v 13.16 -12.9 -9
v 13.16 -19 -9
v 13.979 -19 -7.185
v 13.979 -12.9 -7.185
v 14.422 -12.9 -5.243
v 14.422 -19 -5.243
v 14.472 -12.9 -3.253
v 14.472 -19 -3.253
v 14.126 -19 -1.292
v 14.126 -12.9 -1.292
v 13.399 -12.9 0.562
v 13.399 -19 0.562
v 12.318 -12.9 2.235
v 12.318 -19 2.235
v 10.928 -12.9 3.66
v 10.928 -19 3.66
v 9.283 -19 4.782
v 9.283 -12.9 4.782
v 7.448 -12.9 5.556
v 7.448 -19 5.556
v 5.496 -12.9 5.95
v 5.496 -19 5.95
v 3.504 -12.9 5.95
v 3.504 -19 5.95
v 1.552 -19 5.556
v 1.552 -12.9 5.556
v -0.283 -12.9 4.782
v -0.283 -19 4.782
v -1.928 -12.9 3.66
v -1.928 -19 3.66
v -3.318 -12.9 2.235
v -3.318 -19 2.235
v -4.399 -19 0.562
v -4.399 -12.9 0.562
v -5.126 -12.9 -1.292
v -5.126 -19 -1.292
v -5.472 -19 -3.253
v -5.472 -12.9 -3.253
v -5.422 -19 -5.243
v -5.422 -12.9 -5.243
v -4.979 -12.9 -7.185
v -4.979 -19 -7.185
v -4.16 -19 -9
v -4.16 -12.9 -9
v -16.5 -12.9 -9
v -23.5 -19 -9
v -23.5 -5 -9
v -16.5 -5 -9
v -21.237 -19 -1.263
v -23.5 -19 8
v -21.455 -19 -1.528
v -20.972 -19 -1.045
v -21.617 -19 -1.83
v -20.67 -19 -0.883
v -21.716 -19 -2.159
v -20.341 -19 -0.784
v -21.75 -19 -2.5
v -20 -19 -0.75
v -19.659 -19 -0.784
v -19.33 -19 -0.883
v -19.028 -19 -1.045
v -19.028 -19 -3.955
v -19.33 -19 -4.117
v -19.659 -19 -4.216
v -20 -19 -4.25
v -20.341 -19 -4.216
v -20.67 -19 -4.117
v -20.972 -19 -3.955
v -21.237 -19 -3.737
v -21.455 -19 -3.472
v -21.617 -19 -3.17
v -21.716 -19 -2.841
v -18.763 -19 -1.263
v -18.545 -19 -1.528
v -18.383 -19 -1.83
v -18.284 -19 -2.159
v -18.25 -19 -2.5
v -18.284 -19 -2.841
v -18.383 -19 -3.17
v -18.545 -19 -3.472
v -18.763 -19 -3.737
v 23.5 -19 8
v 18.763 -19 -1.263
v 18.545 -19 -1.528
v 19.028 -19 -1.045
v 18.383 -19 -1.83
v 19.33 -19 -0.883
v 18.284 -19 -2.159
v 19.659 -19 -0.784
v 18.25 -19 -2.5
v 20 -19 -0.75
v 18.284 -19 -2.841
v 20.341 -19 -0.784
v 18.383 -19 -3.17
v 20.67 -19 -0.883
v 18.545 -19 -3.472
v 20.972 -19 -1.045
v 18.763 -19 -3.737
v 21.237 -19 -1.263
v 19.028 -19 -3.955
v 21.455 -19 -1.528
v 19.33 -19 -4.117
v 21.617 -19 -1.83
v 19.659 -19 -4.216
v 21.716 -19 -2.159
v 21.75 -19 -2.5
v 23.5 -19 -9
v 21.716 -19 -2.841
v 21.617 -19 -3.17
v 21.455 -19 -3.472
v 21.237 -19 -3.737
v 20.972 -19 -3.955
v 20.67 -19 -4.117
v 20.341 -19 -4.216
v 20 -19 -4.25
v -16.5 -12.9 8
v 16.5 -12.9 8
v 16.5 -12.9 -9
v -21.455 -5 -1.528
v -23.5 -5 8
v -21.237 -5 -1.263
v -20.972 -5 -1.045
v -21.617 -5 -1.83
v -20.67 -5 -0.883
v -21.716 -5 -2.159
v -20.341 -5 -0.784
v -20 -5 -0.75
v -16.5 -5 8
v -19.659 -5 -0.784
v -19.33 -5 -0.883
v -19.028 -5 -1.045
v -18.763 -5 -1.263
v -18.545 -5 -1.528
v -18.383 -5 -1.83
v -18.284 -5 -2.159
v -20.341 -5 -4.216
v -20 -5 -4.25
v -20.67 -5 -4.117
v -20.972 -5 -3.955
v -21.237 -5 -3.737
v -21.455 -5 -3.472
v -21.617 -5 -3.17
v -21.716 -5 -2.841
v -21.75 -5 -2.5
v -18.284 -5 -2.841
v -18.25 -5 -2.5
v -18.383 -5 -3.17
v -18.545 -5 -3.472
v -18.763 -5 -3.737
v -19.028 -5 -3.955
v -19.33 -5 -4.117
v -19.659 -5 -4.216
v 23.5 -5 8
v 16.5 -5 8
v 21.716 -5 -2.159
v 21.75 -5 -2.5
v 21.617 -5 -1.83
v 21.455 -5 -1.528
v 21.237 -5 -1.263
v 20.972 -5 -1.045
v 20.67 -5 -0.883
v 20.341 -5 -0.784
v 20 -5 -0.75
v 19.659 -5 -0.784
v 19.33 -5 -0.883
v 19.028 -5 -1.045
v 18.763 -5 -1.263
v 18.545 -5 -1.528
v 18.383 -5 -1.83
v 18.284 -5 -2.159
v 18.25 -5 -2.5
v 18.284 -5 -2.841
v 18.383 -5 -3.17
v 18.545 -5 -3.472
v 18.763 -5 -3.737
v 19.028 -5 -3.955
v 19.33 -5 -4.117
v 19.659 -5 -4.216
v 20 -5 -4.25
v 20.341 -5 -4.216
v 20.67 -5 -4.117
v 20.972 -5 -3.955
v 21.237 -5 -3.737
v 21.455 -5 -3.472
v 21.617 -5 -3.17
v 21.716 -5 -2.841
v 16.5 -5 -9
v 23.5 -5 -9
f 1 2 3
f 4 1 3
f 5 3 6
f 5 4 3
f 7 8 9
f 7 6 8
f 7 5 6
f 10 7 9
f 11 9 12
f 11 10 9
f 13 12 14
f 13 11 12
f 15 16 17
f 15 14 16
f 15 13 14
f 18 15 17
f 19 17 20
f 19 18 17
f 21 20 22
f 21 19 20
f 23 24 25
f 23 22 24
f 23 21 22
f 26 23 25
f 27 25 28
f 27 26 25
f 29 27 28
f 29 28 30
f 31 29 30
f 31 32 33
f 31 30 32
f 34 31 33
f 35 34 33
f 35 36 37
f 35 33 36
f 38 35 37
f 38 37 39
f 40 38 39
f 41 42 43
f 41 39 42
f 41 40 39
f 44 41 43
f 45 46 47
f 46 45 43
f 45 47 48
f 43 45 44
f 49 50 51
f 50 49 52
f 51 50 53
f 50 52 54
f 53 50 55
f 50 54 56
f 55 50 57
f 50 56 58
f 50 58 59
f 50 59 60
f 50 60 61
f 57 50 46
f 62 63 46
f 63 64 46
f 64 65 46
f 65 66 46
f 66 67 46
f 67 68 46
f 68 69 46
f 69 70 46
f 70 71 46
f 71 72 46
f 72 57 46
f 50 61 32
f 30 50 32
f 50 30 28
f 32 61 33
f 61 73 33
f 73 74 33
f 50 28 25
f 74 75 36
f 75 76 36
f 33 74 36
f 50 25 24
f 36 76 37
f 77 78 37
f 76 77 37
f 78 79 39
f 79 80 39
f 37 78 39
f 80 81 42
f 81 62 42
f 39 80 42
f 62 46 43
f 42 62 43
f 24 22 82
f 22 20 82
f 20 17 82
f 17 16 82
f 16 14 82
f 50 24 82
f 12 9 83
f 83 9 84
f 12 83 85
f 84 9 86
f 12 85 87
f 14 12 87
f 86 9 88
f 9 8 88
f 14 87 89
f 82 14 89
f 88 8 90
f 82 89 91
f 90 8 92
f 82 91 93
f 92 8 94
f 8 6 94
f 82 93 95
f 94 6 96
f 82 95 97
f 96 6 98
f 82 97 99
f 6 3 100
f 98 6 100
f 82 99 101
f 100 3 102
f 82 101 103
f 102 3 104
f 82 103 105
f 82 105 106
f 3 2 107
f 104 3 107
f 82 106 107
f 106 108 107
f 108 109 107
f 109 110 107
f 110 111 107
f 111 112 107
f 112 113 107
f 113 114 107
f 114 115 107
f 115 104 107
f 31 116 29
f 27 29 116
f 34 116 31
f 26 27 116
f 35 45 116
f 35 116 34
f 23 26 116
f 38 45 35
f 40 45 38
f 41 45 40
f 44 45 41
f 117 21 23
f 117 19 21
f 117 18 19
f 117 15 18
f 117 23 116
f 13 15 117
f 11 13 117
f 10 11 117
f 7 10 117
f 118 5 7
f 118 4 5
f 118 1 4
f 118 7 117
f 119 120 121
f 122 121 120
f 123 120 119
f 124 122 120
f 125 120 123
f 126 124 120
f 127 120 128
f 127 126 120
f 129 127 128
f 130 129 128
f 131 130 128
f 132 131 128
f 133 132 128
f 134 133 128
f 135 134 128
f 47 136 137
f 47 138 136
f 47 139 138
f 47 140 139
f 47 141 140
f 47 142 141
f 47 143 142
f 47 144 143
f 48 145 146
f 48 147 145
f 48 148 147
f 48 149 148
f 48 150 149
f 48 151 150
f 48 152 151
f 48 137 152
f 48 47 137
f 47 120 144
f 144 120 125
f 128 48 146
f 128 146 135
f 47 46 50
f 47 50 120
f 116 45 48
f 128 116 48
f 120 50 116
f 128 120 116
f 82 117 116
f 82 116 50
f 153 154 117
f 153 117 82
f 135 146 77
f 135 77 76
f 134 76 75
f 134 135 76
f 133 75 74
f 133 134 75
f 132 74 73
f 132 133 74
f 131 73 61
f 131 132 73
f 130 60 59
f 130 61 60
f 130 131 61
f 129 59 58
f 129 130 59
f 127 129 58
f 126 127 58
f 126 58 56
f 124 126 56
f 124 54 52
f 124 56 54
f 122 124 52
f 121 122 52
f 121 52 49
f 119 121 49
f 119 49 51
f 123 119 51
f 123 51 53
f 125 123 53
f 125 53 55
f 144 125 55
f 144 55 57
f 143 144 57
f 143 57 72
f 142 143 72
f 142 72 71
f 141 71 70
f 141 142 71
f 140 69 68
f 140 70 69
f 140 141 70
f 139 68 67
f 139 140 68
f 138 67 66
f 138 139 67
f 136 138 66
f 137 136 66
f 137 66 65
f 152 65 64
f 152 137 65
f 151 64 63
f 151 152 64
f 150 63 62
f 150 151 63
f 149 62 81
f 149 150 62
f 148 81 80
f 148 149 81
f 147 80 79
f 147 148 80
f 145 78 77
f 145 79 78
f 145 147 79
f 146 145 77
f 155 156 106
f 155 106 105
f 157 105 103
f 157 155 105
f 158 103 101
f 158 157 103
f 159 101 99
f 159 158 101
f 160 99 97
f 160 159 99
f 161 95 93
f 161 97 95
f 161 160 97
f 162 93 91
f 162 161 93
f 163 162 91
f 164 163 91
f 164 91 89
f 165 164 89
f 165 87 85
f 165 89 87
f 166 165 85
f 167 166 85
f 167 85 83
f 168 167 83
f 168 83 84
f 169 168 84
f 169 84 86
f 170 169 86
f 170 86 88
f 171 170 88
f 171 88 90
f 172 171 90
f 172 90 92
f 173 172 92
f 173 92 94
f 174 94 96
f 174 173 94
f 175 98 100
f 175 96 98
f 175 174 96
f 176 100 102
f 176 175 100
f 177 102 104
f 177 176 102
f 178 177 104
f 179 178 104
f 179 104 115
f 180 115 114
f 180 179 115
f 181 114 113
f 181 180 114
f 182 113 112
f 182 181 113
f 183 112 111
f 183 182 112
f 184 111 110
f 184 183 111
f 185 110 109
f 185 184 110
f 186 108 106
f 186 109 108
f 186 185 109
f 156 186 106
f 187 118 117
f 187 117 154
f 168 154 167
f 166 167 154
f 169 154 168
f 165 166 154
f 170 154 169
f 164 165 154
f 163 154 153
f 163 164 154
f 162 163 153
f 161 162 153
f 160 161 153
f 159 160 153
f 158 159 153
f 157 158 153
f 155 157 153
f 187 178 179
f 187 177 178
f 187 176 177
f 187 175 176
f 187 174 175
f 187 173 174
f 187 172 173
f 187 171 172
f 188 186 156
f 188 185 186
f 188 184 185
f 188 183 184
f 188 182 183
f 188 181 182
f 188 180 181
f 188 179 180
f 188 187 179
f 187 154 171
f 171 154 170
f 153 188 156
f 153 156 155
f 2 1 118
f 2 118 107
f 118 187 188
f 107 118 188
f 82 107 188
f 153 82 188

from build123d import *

# Parameters (mm, degrees)
CYLINDER025_R          = 1.75
CYLINDER025_DEPTH      = 44
CYLINDER025_ROLL_ANGLE = 90
CYLINDER034_R          = 1.75
CYLINDER034_DEPTH      = 44
CYLINDER034_ROLL_ANGLE = 90
CYLINDER035_R          = 1.75
CYLINDER035_DEPTH      = 44
CYLINDER035_ROLL_ANGLE = 90
CYLINDER036_R          = 10
CYLINDER036_DEPTH      = 34
CYLINDER036_ROLL_ANGLE = 90
CYLINDER024_R          = 1.75
CYLINDER024_DEPTH      = 44
CYLINDER024_ROLL_ANGLE = 90
BOX052_W               = 7
BOX052_H               = 7.9
BOX052_DEPTH           = 17
BOX050_W               = 47
BOX050_H               = 6.1
BOX050_DEPTH           = 17
BOX051_W               = 7
BOX051_H               = 7.9
BOX051_DEPTH           = 17


with BuildPart() as cylinder_for_hole_10_groovemount_r001:
    # Cylinder025 → Cylinder025 (new body)
    with BuildSketch(Plane.XY):
        Circle(CYLINDER025_R)
    extrude(amount=CYLINDER025_DEPTH)


with BuildPart() as cylinder_for_hole_10_groovemount_r001_1:
    # Cylinder025 roll: moved
    add(cylinder_for_hole_10_groovemount_r001.part.rotate(Axis((0, 0, 0), (1, 0, 0)), CYLINDER025_ROLL_ANGLE))


with BuildPart() as cylinder_for_hole_10_groovemount_r001_2:
    # Cylinder025 placement: moved
    add(cylinder_for_hole_10_groovemount_r001_1.part.moved(Location((20, 6, -2.5))))


with BuildPart() as cylinder_for_hole_3_motherboard002:
    # Cylinder034 → Cylinder034 (new body)
    with BuildSketch(Plane.XY):
        Circle(CYLINDER034_R)
    extrude(amount=CYLINDER034_DEPTH)


with BuildPart() as cylinder_for_hole_3_motherboard002_1:
    # Cylinder034 roll: moved
    add(cylinder_for_hole_3_motherboard002.part.rotate(Axis((0, 0, 0), (1, 0, 0)), CYLINDER034_ROLL_ANGLE))


with BuildPart() as cylinder_for_hole_3_motherboard002_2:
    # Cylinder034 placement: moved
    add(cylinder_for_hole_3_motherboard002_1.part.moved(Location((-20, 6, -13.5))))


with BuildPart() as cylinder_for_hole_4_motherboard002:
    # Cylinder035 → Cylinder035 (new body)
    with BuildSketch(Plane.XY):
        Circle(CYLINDER035_R)
    extrude(amount=CYLINDER035_DEPTH)


with BuildPart() as cylinder_for_hole_4_motherboard002_1:
    # Cylinder035 roll: moved
    add(cylinder_for_hole_4_motherboard002.part.rotate(Axis((0, 0, 0), (1, 0, 0)), CYLINDER035_ROLL_ANGLE))


with BuildPart() as cylinder_for_hole_4_motherboard002_2:
    # Cylinder035 placement: moved
    add(cylinder_for_hole_4_motherboard002_1.part.moved(Location((20, 6, -13.5))))


with BuildPart() as coldend_carriage_plate_hole:
    # Cylinder036 → Cylinder036 (new body)
    with BuildSketch(Plane.XY):
        Circle(CYLINDER036_R)
    extrude(amount=CYLINDER036_DEPTH)


with BuildPart() as coldend_carriage_plate_hole_1:
    # Cylinder036 roll: moved
    add(coldend_carriage_plate_hole.part.rotate(Axis((0, 0, 0), (1, 0, 0)), CYLINDER036_ROLL_ANGLE))


with BuildPart() as coldend_carriage_plate_hole_2:
    # Cylinder036 placement: moved
    add(coldend_carriage_plate_hole_1.part.moved(Location((4.5, 0, -4))))


with BuildPart() as coldend_carriage_holes:
    # Cylinder024 → Cylinder024 (new body)
    with BuildSketch(Plane.XY):
        Circle(CYLINDER024_R)
    extrude(amount=CYLINDER024_DEPTH)


with BuildPart() as coldend_carriage_holes_1:
    # Cylinder024 roll: moved
    add(coldend_carriage_holes.part.rotate(Axis((0, 0, 0), (1, 0, 0)), CYLINDER024_ROLL_ANGLE))


with BuildPart() as coldend_carriage_holes_2:
    # Cylinder024 placement: moved
    add(coldend_carriage_holes_1.part.moved(Location((-20, 6, -2.5))))

    # Fusion009: union cylinder for hole 10 - Groovemount R001, cylinder for hole 3 - Motherboard002, cylinder for hole 4 - Motherboard002, coldend carriage plate hole
    add(cylinder_for_hole_10_groovemount_r001_2.part)
    add(cylinder_for_hole_3_motherboard002_2.part)
    add(cylinder_for_hole_4_motherboard002_2.part)
    add(coldend_carriage_plate_hole_2.part)


with BuildPart() as coldend_cariage_structure_l:
    # Box052 → Box052 (new body)
    with BuildSketch(Plane(origin=(-23.5, -12.9, -9), x_dir=(1, 0, 0), z_dir=(0, 0, 1))):
        with Locations((3.5, 3.95)):
            Rectangle(BOX052_W, BOX052_H)
    extrude(amount=BOX052_DEPTH)


with BuildPart() as coldend_carriage_plate:
    # Box050 → Box050 (new body)
    with BuildSketch(Plane(origin=(-23.5, -19, -9), x_dir=(1, 0, 0), z_dir=(0, 0, 1))):
        with Locations((23.5, 3.05)):
            Rectangle(BOX050_W, BOX050_H)
    extrude(amount=BOX050_DEPTH)


with BuildPart() as coldend_attach_structure_with_holes:
    # Box051 → Box051 (new body)
    with BuildSketch(Plane(origin=(16.5, -12.9, -9), x_dir=(1, 0, 0), z_dir=(0, 0, 1))):
        with Locations((3.5, 3.95)):
            Rectangle(BOX051_W, BOX051_H)
    extrude(amount=BOX051_DEPTH)

    # Fusion010: union coldend cariage structure L, coldend carriage plate
    add(coldend_cariage_structure_l.part)
    add(coldend_carriage_plate.part)

    # Cut008: cut coldend carriage holes
    add(coldend_carriage_holes_2.part, mode=Mode.SUBTRACT)


solid = coldend_attach_structure_with_holes.part
